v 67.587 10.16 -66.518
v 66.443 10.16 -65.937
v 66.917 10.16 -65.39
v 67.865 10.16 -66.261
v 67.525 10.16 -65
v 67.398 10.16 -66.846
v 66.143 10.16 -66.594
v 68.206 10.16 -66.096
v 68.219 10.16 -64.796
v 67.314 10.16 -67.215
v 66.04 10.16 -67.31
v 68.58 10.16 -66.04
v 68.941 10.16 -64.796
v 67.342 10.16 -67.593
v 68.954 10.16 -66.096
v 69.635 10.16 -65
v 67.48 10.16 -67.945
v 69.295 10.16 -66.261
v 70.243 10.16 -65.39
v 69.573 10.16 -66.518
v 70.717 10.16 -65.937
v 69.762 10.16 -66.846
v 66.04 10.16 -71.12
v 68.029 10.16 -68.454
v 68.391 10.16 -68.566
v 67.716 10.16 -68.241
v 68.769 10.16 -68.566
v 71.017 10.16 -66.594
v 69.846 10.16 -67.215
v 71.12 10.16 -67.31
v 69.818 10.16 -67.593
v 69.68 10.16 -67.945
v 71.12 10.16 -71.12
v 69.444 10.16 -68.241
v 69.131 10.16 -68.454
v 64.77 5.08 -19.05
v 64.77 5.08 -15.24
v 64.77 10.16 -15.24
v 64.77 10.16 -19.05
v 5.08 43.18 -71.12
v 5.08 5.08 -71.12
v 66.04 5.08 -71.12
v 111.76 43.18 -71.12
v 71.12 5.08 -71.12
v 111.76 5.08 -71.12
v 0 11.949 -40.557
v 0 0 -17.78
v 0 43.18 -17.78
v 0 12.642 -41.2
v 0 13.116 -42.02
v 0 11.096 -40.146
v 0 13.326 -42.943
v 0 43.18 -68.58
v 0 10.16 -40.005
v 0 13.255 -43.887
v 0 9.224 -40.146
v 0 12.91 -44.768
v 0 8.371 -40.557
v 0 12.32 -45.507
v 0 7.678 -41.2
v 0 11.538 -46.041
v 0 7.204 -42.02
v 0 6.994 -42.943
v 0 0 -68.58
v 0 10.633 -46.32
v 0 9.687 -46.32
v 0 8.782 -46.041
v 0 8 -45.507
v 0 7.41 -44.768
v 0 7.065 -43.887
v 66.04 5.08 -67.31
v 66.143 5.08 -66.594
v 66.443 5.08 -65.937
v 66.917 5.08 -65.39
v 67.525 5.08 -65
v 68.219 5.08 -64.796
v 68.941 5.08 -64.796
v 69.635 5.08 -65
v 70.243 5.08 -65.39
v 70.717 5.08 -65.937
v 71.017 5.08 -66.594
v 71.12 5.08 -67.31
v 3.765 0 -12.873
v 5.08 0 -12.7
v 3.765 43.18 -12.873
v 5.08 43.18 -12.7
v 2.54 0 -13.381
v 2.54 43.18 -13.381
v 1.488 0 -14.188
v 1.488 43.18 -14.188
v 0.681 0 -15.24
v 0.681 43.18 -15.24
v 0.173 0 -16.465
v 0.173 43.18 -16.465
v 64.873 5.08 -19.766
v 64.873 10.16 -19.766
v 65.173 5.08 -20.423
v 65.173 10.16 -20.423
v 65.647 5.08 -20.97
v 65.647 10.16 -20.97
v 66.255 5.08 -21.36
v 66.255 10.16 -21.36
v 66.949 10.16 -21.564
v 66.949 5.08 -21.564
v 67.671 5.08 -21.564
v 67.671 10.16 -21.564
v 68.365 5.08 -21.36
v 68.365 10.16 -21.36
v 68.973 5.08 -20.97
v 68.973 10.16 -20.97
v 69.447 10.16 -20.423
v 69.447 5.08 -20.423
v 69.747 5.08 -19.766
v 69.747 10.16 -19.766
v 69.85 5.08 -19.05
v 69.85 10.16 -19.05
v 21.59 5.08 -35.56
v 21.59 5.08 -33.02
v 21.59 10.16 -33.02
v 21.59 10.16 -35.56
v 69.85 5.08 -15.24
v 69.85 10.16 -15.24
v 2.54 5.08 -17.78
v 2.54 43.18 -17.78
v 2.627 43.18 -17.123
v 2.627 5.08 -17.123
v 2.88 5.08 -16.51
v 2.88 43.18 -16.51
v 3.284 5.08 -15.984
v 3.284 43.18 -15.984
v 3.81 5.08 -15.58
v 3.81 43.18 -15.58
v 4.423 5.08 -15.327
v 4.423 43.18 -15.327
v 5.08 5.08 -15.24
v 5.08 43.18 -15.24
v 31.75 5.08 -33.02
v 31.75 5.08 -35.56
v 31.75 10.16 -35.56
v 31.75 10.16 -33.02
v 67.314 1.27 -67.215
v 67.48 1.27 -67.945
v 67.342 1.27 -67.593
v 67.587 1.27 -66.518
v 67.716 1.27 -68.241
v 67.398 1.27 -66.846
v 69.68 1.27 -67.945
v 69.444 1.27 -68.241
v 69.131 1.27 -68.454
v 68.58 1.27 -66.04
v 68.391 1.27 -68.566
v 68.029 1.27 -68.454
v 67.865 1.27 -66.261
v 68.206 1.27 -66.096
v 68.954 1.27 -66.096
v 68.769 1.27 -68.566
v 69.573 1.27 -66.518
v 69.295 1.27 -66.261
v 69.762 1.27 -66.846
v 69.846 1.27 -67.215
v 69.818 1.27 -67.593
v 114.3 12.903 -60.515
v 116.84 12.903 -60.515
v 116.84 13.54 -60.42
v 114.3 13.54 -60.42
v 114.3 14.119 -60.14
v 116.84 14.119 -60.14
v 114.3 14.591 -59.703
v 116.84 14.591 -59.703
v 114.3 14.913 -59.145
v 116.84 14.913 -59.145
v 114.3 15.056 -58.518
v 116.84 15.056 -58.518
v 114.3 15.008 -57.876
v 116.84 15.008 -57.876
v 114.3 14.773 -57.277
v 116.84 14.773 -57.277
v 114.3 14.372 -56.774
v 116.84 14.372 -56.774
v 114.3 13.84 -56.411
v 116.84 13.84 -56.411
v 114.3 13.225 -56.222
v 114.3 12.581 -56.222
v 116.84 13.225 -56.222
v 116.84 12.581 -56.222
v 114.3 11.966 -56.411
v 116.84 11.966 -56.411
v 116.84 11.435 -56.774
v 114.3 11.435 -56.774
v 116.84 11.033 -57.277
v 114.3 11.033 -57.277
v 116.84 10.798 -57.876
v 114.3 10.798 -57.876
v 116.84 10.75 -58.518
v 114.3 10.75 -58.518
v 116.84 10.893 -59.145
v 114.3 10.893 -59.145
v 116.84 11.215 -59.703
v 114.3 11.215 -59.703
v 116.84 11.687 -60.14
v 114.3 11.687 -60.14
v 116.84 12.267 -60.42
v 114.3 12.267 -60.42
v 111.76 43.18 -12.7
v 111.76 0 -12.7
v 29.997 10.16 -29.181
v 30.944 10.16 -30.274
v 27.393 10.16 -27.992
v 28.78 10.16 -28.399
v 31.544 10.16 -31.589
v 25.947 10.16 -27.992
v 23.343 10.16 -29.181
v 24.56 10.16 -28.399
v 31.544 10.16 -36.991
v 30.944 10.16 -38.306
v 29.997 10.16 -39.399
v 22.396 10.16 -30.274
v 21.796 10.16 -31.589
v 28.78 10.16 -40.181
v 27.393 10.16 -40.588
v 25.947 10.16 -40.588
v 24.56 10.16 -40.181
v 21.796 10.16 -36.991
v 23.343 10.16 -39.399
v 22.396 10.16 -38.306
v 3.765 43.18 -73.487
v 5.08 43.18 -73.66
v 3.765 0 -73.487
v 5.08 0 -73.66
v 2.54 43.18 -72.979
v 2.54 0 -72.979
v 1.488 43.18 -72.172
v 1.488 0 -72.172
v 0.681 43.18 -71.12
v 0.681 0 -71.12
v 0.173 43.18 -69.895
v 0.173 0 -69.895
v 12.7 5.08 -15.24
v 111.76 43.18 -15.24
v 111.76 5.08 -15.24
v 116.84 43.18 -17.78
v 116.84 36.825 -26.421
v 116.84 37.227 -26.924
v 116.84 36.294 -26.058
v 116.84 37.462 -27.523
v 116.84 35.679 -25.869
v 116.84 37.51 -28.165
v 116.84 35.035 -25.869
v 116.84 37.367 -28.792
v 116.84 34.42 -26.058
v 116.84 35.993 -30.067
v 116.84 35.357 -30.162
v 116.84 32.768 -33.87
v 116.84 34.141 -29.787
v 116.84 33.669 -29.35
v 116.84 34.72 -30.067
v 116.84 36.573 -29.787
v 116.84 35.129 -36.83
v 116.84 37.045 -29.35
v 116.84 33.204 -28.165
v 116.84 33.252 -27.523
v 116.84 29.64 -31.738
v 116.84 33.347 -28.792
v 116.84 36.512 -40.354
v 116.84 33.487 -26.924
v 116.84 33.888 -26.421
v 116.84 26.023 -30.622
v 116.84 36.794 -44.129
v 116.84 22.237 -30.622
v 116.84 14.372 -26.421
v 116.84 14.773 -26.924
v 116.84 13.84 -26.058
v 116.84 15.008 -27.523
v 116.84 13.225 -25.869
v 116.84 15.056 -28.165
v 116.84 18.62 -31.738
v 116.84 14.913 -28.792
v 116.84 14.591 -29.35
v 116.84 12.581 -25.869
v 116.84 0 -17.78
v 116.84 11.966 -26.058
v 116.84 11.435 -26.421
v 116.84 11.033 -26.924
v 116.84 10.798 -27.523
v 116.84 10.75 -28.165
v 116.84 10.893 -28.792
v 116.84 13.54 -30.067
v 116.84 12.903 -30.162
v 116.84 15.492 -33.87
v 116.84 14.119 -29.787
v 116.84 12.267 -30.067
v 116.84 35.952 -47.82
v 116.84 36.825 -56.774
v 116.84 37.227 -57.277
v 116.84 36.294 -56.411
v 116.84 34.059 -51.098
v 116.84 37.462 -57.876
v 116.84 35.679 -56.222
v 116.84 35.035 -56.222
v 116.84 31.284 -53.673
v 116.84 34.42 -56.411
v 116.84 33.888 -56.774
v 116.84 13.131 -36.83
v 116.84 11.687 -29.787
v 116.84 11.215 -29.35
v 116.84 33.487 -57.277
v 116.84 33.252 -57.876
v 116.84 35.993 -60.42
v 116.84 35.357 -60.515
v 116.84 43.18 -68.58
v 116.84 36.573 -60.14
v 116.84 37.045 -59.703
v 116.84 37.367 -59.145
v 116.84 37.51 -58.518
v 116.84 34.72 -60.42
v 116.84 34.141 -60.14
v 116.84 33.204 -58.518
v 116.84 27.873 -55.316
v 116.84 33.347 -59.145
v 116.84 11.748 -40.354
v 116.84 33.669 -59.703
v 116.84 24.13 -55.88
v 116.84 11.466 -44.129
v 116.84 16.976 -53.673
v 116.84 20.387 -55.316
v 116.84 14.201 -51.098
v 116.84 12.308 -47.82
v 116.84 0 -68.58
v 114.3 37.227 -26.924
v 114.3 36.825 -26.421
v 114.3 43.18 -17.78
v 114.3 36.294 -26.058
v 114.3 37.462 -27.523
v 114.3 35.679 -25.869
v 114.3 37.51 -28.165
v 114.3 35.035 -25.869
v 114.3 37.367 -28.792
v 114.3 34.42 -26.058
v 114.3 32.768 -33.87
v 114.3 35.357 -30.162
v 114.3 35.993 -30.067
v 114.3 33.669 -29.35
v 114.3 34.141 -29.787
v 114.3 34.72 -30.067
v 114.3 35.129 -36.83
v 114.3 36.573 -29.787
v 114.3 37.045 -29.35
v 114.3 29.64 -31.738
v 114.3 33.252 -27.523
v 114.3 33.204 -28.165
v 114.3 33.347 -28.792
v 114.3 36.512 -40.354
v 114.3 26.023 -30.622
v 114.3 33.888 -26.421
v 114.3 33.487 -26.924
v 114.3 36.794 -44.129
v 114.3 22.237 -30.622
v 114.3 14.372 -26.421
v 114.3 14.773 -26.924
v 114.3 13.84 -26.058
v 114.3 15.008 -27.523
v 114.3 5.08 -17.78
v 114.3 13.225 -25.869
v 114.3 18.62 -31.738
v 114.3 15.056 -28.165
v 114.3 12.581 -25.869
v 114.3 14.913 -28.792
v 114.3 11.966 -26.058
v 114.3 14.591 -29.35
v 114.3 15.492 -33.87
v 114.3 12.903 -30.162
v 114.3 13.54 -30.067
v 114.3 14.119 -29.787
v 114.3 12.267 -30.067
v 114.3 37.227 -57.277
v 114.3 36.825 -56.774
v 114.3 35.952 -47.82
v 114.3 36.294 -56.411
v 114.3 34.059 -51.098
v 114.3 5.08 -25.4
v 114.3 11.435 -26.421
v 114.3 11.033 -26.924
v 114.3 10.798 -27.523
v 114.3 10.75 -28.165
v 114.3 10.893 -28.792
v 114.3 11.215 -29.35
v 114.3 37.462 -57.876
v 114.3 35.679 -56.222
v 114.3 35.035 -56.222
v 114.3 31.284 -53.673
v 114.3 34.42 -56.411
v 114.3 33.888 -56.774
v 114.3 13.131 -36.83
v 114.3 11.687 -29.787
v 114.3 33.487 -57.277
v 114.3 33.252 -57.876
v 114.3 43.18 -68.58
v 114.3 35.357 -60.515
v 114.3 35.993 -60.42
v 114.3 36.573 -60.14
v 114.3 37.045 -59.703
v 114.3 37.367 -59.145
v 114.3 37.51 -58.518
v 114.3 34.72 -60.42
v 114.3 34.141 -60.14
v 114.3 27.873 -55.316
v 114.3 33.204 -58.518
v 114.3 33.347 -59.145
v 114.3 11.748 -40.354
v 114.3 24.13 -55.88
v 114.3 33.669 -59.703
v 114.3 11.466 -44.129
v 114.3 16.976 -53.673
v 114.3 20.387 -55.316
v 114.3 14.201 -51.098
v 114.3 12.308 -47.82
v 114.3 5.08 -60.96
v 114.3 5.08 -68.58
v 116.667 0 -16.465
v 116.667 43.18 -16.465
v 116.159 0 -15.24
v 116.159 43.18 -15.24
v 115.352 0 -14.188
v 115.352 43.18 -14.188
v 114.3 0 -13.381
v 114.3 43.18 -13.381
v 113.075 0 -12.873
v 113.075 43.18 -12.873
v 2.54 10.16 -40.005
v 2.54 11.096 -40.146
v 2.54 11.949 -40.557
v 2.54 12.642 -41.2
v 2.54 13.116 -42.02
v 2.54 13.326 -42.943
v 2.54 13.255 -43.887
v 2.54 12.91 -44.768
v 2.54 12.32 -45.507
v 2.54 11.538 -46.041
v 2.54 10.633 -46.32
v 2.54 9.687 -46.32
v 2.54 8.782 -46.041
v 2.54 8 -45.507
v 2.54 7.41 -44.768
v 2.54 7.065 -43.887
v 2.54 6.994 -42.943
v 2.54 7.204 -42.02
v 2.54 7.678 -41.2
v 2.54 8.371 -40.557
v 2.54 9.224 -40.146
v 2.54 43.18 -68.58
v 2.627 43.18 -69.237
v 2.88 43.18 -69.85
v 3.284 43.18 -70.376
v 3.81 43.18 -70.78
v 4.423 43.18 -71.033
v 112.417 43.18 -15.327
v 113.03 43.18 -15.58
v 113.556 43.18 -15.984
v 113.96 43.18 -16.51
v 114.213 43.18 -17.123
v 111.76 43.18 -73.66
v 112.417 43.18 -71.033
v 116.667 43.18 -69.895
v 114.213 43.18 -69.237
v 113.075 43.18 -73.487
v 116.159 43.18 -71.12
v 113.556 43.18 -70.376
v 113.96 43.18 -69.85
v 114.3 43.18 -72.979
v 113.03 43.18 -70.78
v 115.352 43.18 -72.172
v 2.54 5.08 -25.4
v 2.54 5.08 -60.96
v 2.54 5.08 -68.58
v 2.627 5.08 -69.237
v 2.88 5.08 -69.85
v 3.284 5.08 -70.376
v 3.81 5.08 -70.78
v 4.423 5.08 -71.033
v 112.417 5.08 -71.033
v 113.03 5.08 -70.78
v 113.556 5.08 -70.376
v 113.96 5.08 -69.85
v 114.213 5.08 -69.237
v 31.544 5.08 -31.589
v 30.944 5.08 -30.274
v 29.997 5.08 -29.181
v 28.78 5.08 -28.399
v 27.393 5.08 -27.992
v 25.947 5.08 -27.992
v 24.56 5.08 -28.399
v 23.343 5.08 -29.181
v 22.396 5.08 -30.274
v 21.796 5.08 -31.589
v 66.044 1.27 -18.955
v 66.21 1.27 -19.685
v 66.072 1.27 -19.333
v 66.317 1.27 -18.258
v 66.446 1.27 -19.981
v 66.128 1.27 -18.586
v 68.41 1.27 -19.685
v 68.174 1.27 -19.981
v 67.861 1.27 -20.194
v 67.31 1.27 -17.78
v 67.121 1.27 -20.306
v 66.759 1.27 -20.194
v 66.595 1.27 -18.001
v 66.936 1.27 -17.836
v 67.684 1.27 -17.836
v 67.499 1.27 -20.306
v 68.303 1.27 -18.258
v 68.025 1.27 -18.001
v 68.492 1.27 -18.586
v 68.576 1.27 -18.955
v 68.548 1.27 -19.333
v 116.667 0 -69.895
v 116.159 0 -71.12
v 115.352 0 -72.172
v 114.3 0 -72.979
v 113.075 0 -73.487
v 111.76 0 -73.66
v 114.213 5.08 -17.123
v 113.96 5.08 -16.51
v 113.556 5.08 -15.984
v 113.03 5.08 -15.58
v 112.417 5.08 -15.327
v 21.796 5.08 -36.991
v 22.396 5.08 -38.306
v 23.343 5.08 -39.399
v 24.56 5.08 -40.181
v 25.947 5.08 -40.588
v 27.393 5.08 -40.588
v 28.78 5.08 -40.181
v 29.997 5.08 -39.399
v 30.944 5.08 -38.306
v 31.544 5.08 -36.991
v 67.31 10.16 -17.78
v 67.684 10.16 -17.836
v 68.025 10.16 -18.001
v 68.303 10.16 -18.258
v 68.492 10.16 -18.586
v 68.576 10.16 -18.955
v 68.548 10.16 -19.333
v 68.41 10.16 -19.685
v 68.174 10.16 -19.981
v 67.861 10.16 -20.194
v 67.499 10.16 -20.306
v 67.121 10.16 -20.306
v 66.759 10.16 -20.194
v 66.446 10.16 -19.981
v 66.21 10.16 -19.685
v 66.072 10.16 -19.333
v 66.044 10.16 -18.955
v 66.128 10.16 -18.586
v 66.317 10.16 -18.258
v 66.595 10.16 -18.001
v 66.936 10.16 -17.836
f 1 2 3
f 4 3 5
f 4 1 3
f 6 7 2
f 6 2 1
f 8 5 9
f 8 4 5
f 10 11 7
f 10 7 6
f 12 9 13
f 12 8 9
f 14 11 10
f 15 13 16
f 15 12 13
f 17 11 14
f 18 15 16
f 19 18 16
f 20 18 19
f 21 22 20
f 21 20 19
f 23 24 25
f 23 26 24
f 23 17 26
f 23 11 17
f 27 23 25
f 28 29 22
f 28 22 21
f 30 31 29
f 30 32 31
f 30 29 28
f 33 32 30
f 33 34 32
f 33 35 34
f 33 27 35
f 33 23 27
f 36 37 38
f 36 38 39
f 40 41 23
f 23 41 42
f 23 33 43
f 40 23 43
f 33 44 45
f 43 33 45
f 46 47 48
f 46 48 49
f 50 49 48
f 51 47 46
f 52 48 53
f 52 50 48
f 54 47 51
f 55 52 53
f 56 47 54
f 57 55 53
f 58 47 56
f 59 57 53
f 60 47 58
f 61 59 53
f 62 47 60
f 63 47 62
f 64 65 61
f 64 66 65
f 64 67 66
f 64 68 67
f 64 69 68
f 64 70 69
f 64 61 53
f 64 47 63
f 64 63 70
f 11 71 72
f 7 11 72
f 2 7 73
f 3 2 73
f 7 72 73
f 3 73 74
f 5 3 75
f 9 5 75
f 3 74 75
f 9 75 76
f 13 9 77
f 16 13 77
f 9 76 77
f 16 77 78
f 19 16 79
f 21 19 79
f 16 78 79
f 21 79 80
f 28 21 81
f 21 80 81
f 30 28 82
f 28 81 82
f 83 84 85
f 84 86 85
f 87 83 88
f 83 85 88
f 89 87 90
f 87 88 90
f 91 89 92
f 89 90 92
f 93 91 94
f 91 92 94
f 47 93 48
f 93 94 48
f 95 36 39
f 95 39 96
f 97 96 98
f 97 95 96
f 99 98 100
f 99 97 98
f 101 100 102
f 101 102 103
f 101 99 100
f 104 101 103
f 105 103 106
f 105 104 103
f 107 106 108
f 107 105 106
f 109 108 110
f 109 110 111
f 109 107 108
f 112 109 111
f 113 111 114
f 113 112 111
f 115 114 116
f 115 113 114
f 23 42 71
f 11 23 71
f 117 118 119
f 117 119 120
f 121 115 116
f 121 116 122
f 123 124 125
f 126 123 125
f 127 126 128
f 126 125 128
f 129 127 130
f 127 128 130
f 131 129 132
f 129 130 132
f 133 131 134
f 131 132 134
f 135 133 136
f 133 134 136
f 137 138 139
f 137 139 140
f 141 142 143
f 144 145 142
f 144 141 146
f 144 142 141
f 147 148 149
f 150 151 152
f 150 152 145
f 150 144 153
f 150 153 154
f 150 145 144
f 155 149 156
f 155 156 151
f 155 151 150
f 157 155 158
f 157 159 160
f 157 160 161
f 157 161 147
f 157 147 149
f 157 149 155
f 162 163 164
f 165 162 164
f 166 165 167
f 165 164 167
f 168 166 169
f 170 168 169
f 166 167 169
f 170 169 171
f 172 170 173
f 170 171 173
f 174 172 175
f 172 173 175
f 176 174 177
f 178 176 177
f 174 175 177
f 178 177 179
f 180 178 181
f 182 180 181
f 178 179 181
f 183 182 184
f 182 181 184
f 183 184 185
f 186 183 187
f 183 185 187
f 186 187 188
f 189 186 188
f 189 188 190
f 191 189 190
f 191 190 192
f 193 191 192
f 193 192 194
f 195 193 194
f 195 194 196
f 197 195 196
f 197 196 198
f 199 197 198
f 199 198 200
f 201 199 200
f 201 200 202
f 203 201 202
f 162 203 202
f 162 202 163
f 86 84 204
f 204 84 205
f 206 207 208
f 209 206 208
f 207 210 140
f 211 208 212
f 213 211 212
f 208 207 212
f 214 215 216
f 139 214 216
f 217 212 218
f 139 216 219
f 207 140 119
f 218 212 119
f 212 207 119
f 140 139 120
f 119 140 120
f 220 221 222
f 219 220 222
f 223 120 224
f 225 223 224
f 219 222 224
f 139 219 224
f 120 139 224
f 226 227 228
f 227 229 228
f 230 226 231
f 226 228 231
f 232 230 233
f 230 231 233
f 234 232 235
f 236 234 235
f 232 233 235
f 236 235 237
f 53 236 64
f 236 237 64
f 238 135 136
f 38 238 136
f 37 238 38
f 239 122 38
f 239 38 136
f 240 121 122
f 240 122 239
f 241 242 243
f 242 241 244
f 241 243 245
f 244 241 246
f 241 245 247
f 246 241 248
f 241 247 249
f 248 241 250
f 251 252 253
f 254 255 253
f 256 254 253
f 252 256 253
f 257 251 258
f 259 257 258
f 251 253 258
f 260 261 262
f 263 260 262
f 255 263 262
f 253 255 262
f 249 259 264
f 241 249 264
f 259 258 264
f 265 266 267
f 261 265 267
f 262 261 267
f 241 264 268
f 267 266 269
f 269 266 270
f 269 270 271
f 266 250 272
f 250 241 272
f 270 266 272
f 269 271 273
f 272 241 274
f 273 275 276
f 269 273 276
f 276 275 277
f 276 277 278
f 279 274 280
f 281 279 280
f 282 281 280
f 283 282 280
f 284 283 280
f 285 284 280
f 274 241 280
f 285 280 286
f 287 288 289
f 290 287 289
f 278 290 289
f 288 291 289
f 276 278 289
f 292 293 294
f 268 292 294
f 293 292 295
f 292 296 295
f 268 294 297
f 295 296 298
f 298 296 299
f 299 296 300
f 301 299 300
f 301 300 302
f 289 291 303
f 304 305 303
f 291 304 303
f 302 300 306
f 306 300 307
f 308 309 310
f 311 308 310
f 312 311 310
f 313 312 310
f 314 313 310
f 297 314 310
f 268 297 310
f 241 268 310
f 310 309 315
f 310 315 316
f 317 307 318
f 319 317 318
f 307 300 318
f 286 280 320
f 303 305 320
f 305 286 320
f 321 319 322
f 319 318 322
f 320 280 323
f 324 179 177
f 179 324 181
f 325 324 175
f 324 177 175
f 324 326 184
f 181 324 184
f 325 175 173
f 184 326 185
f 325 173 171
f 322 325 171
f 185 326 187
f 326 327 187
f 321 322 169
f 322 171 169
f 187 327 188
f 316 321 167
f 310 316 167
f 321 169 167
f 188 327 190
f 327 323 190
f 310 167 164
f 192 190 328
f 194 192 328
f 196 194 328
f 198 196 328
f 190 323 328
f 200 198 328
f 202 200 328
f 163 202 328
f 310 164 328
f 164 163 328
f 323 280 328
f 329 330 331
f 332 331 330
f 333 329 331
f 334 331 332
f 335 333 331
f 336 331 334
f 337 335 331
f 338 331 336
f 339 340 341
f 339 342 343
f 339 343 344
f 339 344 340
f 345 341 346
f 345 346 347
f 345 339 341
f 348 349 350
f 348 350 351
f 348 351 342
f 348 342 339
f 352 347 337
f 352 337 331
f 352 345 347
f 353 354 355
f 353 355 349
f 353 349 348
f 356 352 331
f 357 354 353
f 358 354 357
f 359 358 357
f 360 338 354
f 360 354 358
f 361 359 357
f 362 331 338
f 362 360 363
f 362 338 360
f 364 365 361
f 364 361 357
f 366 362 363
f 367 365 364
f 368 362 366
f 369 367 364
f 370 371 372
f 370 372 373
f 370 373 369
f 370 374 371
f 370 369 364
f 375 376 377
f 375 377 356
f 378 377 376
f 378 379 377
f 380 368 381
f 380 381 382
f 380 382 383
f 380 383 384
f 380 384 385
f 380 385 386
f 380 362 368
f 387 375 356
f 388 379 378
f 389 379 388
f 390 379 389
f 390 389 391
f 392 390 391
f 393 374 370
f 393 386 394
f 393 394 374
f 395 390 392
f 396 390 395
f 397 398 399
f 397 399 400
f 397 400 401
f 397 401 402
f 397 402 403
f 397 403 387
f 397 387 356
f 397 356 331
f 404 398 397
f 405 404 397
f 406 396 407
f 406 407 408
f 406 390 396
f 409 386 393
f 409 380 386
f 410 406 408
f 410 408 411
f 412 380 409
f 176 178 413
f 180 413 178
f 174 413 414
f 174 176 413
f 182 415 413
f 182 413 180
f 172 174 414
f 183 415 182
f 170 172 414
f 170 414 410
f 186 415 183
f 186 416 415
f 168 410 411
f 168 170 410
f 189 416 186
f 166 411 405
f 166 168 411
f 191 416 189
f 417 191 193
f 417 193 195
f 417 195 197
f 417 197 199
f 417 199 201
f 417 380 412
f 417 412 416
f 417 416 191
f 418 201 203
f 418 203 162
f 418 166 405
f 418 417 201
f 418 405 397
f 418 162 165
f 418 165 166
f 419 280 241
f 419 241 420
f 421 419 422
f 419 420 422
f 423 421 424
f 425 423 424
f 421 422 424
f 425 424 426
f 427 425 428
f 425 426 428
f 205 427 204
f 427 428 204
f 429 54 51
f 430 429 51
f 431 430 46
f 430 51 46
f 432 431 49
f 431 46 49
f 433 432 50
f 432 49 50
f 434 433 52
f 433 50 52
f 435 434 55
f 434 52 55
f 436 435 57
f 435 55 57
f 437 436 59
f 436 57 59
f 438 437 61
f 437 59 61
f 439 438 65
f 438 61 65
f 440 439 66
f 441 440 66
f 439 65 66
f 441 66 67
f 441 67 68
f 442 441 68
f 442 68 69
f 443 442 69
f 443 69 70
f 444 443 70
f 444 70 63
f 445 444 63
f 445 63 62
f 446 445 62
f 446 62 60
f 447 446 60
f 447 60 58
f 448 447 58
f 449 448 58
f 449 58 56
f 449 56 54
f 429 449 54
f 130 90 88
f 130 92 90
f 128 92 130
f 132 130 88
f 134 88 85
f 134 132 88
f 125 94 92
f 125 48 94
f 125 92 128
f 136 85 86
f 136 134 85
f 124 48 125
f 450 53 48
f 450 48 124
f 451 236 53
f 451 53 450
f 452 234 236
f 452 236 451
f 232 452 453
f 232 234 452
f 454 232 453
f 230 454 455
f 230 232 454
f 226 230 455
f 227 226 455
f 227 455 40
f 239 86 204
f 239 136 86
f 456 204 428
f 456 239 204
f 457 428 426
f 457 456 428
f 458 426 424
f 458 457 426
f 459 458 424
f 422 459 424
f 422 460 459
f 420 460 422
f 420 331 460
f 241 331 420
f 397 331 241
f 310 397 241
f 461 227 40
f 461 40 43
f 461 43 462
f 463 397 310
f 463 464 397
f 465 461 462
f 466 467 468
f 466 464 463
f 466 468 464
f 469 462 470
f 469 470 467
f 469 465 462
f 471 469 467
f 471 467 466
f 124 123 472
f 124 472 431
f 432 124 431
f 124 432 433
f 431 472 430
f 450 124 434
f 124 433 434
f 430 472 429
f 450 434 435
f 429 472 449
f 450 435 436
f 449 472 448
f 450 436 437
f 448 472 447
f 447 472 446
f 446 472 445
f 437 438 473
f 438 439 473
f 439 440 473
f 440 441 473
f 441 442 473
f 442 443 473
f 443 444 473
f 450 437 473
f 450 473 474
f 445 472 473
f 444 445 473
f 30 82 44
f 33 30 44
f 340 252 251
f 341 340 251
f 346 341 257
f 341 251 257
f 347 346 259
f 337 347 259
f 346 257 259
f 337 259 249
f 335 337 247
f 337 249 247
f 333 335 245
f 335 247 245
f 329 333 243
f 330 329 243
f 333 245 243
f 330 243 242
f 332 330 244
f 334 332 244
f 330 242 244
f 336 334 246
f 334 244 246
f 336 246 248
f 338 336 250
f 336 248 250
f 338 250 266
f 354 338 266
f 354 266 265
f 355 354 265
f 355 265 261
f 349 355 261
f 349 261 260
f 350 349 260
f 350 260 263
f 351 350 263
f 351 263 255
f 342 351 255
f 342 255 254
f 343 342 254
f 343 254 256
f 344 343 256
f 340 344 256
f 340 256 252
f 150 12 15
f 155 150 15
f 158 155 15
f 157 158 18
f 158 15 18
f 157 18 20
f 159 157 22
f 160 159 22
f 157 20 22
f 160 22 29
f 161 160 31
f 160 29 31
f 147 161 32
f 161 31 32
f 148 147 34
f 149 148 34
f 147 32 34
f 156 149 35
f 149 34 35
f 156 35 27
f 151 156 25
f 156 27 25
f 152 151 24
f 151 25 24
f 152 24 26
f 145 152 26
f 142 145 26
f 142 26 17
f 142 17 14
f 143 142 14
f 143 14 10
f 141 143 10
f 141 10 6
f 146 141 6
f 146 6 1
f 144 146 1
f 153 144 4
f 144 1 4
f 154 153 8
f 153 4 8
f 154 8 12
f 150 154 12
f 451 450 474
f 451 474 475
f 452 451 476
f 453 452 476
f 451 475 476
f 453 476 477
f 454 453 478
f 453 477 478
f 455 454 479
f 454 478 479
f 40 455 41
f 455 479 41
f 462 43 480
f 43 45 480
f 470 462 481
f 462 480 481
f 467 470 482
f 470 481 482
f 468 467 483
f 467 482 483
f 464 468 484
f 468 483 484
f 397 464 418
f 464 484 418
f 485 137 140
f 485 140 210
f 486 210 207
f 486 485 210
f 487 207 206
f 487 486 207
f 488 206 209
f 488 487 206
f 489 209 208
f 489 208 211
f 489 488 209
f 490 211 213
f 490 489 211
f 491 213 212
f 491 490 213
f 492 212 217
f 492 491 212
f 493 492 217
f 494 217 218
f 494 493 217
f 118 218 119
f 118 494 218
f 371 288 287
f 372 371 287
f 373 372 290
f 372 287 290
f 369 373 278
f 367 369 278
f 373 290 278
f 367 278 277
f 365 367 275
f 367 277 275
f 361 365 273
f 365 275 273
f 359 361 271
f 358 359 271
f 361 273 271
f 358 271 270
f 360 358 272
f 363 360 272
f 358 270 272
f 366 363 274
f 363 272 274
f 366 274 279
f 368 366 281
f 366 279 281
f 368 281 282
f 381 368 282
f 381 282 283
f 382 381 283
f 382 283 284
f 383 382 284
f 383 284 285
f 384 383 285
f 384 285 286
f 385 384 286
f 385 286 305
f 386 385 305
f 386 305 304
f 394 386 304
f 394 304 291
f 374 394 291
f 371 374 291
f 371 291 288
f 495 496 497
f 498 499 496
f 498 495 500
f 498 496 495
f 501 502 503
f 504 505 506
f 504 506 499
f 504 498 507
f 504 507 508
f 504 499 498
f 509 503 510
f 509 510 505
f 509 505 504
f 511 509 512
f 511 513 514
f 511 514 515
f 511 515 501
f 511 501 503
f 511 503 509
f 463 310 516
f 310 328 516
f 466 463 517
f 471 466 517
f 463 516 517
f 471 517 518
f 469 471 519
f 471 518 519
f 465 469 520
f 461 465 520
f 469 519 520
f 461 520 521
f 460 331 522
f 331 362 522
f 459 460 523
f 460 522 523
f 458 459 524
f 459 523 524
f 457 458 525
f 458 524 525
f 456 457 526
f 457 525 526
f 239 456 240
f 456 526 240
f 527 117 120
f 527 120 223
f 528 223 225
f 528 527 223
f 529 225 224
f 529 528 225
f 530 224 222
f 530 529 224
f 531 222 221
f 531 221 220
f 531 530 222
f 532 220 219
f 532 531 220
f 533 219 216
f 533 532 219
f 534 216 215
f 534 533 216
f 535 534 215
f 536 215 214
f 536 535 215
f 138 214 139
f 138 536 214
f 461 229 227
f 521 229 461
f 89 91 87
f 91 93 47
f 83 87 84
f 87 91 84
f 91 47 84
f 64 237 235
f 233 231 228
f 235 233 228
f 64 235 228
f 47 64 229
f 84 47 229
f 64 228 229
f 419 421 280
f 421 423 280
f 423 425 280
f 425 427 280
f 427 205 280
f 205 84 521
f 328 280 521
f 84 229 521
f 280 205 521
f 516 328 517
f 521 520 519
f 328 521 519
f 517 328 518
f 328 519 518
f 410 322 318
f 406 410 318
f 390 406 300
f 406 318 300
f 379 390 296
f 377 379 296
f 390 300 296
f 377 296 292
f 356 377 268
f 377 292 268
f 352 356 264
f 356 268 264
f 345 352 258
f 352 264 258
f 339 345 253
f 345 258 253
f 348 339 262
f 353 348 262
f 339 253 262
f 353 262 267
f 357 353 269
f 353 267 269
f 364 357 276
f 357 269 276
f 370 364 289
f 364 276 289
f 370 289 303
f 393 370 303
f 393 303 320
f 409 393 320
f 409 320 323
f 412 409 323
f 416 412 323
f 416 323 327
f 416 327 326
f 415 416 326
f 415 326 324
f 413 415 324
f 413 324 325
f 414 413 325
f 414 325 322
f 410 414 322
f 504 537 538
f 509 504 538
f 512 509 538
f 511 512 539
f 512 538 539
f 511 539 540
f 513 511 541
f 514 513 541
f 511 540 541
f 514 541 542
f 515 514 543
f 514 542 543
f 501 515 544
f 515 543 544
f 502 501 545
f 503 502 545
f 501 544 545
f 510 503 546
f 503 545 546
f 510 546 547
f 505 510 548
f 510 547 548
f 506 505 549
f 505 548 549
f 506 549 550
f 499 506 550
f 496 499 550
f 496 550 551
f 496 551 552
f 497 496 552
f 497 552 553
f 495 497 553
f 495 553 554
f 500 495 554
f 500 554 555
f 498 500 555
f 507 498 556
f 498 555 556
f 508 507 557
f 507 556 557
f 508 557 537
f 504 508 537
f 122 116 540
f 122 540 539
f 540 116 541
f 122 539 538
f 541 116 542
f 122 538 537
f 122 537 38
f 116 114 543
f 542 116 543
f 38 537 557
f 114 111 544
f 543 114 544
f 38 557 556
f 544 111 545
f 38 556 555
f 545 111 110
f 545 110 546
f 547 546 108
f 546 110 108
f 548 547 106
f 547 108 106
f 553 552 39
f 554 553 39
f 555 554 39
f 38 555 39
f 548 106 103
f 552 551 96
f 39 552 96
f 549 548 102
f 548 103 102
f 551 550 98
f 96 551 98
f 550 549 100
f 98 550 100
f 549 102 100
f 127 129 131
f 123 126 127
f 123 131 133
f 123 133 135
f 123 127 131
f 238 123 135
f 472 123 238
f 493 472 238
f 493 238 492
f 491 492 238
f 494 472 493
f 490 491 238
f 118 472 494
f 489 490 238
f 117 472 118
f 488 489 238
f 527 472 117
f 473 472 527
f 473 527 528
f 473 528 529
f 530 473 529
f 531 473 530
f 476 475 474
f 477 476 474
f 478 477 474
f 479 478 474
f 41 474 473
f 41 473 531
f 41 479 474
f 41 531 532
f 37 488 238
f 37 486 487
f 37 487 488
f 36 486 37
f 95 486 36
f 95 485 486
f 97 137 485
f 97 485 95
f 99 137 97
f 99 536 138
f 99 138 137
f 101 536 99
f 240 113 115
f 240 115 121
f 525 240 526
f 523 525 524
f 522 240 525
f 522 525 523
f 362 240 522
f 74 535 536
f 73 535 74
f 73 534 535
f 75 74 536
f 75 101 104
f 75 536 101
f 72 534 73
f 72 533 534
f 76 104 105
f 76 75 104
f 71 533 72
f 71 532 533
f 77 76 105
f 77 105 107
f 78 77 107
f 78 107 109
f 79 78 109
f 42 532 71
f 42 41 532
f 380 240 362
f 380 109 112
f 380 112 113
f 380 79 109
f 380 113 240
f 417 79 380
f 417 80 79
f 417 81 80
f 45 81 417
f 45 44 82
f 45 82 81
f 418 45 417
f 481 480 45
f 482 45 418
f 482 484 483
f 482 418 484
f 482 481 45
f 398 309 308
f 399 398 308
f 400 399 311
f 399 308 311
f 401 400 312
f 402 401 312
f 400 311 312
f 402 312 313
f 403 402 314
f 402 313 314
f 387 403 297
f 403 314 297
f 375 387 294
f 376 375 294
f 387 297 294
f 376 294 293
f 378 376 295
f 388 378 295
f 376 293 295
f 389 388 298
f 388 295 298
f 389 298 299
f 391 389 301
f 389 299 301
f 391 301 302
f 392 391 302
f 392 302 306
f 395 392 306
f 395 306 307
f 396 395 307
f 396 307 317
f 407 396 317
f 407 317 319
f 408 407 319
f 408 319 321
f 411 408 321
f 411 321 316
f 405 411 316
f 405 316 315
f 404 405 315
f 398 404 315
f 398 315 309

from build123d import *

# Parameters (mm, degrees)
SKETCH1_W            = 116.84
SKETCH1_H            = 86.36
BOSS_EXTRUDE2_DEPTH  = 5.08
FILLET1_R            = 12.7
SKETCH3_W            = 116.84
SKETCH3_H            = 60.96
SKETCH3_W_2          = 111.76
SKETCH3_H_2          = 55.88
BOSS_EXTRUDE3_DEPTH  = 38.1
SKETCH4_W            = 10.16
SKETCH4_H            = 10.16
BOSS_EXTRUDE5_DEPTH  = 34.29
FILLET3_R            = 5.08
SKETCH5_R            = 1.27
CUT_EXTRUDE1_DEPTH   = 34.29
CUT_EXTRUDE2_START   = -5.08
SKETCH6_W            = 198.457473549
SKETCH6_H            = 149.814535244
SKETCH6_W_2          = 116.84
SKETCH6_H_2          = 60.96
CUT_EXTRUDE2_DEPTH   = 5.08
FILLET6_R            = 5.08
CUT_EXTRUDE3_REACH   = 146.713
SKETCH7_R            = 12.7
SKETCH7_R_2          = 2.159
CUT_EXTRUDE4_REACH   = 146.713
SKETCH8_R            = 3.175
BOSS_EXTRUDE9_DEPTH  = 5.08
SKETCH14_R           = 1.27
CUT_EXTRUDE6_DEPTH   = 8.89
SKETCH21_W           = 111.76
SKETCH21_H           = 55.88
CUT_EXTRUDE7_DEPTH   = 29.21
SKETCH22_W           = 20.924478465
SKETCH22_H           = 12.476012494
SKETCH22_W_2         = 15.618152649
SKETCH22_H_2         = 14.190033702
SKETCH22_W_3         = 16.110334819
SKETCH22_H_3         = 13.876033943
SKETCH22_W_4         = 12.045494613
CUT_EXTRUDE8_DEPTH   = 5.08
FILLET7_R            = 2.54
BOSS_EXTRUDE10_DEPTH = 5.08


with BuildPart() as part:
    # Sketch1 → Boss-Extrude2 (new body)
    with BuildSketch(Plane(origin=(0, 0, 0), x_dir=(1, 0, 0), z_dir=(0, 1, 0))):
        with Locations((58.42, 43.18)):
            Rectangle(SKETCH1_W, SKETCH1_H)
    extrude(amount=BOSS_EXTRUDE2_DEPTH)

    # Fillet1
    fillet1_edges = [part.edges().sort_by_distance(p)[0] for p in [
        (0, 2.54, -86.36),
        (116.84, 2.54, -86.36),
        (116.84, 2.54, 0),
        (0, 2.54, 0),
    ]]
    fillet(fillet1_edges, radius=FILLET1_R)

    # Sketch3 → Boss-Extrude3 (add)
    with BuildSketch(Plane(origin=(0, 5.08, 0), x_dir=(1, 0, 0), z_dir=(0, 1, 0))):
        with Locations((58.42, 43.18)):
            Rectangle(SKETCH3_W, SKETCH3_H)
        with Locations((58.42, 43.18)):
            Rectangle(SKETCH3_W_2, SKETCH3_H_2, mode=Mode.SUBTRACT)
    extrude(amount=BOSS_EXTRUDE3_DEPTH)

    # Sketch4 → Boss-Extrude5 (add)
    with BuildSketch(Plane(origin=(0, 5.08, 0), x_dir=(1, 0, 0), z_dir=(0, 1, 0))):
        with Locations((7.62, 66.04)):
            Rectangle(SKETCH4_W, SKETCH4_H)
        with Locations((109.22, 66.04)):
            Rectangle(SKETCH4_W, SKETCH4_H)
        with Locations((109.22, 20.32)):
            Rectangle(SKETCH4_W, SKETCH4_H)
        with Locations((7.62, 20.32)):
            Rectangle(SKETCH4_W, SKETCH4_H)
    extrude(amount=BOSS_EXTRUDE5_DEPTH)

    # Fillet3
    fillet3_edges = [part.edges().sort_by_distance(p)[0] for p in [
        (12.7, 22.225, -25.4),
        (12.7, 22.225, -60.96),
        (104.14, 22.225, -60.96),
        (104.14, 22.225, -25.4),
    ]]
    fillet(fillet3_edges, radius=FILLET3_R)

    # Sketch5 → Cut-Extrude1 (cut)
    with BuildSketch(Plane(origin=(0, 39.37, 0), x_dir=(1, 0, 0), z_dir=(0, 1, 0))):
        with Locations(Location((7.62, 66.04, 0), (0, 0, 270))):
            Circle(SKETCH5_R)
        with Locations(Location((109.22, 66.04, 0), (0, 0, 270))):
            Circle(SKETCH5_R)
        with Locations(Location((109.22, 20.32, 0), (0, 0, 270))):
            Circle(SKETCH5_R)
        with Locations(Location((7.62, 20.32, 0), (0, 0, 270))):
            Circle(SKETCH5_R)
    extrude(amount=-CUT_EXTRUDE1_DEPTH, mode=Mode.SUBTRACT)

    # Sketch6 → Cut-Extrude2 (cut)
    with BuildSketch(Plane(origin=(0, 5.08, 0), x_dir=(1, 0, 0), z_dir=(0, 1, 0)).offset(CUT_EXTRUDE2_START)):
        with Locations((67.603582621, 44.619641428)):
            Rectangle(SKETCH6_W, SKETCH6_H)
        with Locations((58.42, 43.18)):
            Rectangle(SKETCH6_W_2, SKETCH6_H_2, mode=Mode.SUBTRACT)
    extrude(amount=CUT_EXTRUDE2_DEPTH, mode=Mode.SUBTRACT)

    # Fillet6
    fillet6_edges = [part.edges().sort_by_distance(p)[0] for p in [
        (0, 21.59, -12.7),
        (0, 21.59, -73.66),
        (116.84, 21.59, -12.7),
        (116.84, 21.59, -73.66),
    ]]
    fillet(fillet6_edges, radius=FILLET6_R)

    # Sketch7 → Cut-Extrude3 (cut, up to next)
    with BuildSketch(Plane(origin=(116.84, 0, 0), x_dir=(0, 0, -1), z_dir=(1, 0, 0)), mode=Mode.PRIVATE) as cut_extrude3_sk1:
        with Locations((43.18, 24.13)):
            Circle(SKETCH7_R)
    cut_extrude3_tool1 = extrude(cut_extrude3_sk1.sketch, amount=-CUT_EXTRUDE3_REACH, mode=Mode.PRIVATE) & part.part
    # Sketch7 → Cut-Extrude3 (cut, up to next)
    with BuildSketch(Plane(origin=(116.84, 0, 0), x_dir=(0, 0, -1), z_dir=(1, 0, 0)), mode=Mode.PRIVATE) as cut_extrude3_sk2:
        with Locations((28.0035, 35.3568)):
            Circle(SKETCH7_R_2)
    cut_extrude3_tool2 = extrude(cut_extrude3_sk2.sketch, amount=-CUT_EXTRUDE3_REACH, mode=Mode.PRIVATE) & part.part
    # Sketch7 → Cut-Extrude3 (cut, up to next)
    with BuildSketch(Plane(origin=(116.84, 0, 0), x_dir=(0, 0, -1), z_dir=(1, 0, 0)), mode=Mode.PRIVATE) as cut_extrude3_sk3:
        with Locations((58.3565, 35.3568)):
            Circle(SKETCH7_R_2)
    cut_extrude3_tool3 = extrude(cut_extrude3_sk3.sketch, amount=-CUT_EXTRUDE3_REACH, mode=Mode.PRIVATE) & part.part
    # Sketch7 → Cut-Extrude3 (cut, up to next)
    with BuildSketch(Plane(origin=(116.84, 0, 0), x_dir=(0, 0, -1), z_dir=(1, 0, 0)), mode=Mode.PRIVATE) as cut_extrude3_sk4:
        with Locations((28.0035, 12.9032)):
            Circle(SKETCH7_R_2)
    cut_extrude3_tool4 = extrude(cut_extrude3_sk4.sketch, amount=-CUT_EXTRUDE3_REACH, mode=Mode.PRIVATE) & part.part
    # Sketch7 → Cut-Extrude3 (cut, up to next)
    with BuildSketch(Plane(origin=(116.84, 0, 0), x_dir=(0, 0, -1), z_dir=(1, 0, 0)), mode=Mode.PRIVATE) as cut_extrude3_sk5:
        with Locations((58.3565, 12.9032)):
            Circle(SKETCH7_R_2)
    cut_extrude3_tool5 = extrude(cut_extrude3_sk5.sketch, amount=-CUT_EXTRUDE3_REACH, mode=Mode.PRIVATE) & part.part
    add(cut_extrude3_tool1.solids().sort_by_distance((116.84, 24.13, -43.18))[0], mode=Mode.SUBTRACT)
    add(cut_extrude3_tool2.solids().sort_by_distance((116.84, 35.3568, -28.0035))[0], mode=Mode.SUBTRACT)
    add(cut_extrude3_tool3.solids().sort_by_distance((116.84, 35.3568, -58.3565))[0], mode=Mode.SUBTRACT)
    add(cut_extrude3_tool4.solids().sort_by_distance((116.84, 12.9032, -28.0035))[0], mode=Mode.SUBTRACT)
    add(cut_extrude3_tool5.solids().sort_by_distance((116.84, 12.9032, -58.3565))[0], mode=Mode.SUBTRACT)

    # Sketch8 → Cut-Extrude4 (cut, up to next)
    with BuildSketch(Plane.ZY, mode=Mode.PRIVATE) as cut_extrude4_sk1:
        with Locations((-43.18, 10.16)):
            Circle(SKETCH8_R)
    cut_extrude4_tool1 = extrude(cut_extrude4_sk1.sketch, amount=-CUT_EXTRUDE4_REACH, mode=Mode.PRIVATE) & part.part
    add(cut_extrude4_tool1.solids().sort_by_distance((0, 10.16, -43.18))[0], mode=Mode.SUBTRACT)

    # Sketch10 → Boss-Extrude9 (add)
    with BuildSketch(Plane(origin=(0, 5.08, 0), x_dir=(1, 0, 0), z_dir=(0, 1, 0))):
        with BuildLine():
            Line((69.85, 19.05), (69.85, 15.24))
            Line((69.85, 15.24), (64.77, 15.24))
            Line((64.77, 15.24), (64.77, 19.05))
            ThreePointArc((64.77, 19.05), (67.31, 21.59), (69.85, 19.05))
        make_face()
        with BuildLine():
            Line((71.12, 67.31), (71.12, 71.12))
            Line((71.12, 71.12), (66.04, 71.12))
            Line((66.04, 71.12), (66.04, 67.31))
            ThreePointArc((66.04, 67.31), (68.58, 64.77), (71.12, 67.31))
        make_face()
    extrude(amount=BOSS_EXTRUDE9_DEPTH)

    # Sketch14 → Cut-Extrude6 (cut)
    with BuildSketch(Plane(origin=(0, 10.16, 0), x_dir=(1, 0, 0), z_dir=(0, 1, 0))):
        with Locations(Location((67.31, 19.05, 0), (0, 0, 270))):
            Circle(SKETCH14_R)
        with Locations(Location((68.58, 67.31, 0), (0, 0, 270))):
            Circle(SKETCH14_R)
    extrude(amount=-CUT_EXTRUDE6_DEPTH, mode=Mode.SUBTRACT)

    # Sketch21 → Cut-Extrude7 (cut)
    with BuildSketch(Plane(origin=(0, 39.37, 0), x_dir=(1, 0, 0), z_dir=(0, 1, 0))):
        with Locations((58.42, 43.18)):
            Rectangle(SKETCH21_W, SKETCH21_H)
    extrude(amount=-CUT_EXTRUDE7_DEPTH, mode=Mode.SUBTRACT)

    # Sketch22 → Cut-Extrude8 (cut)
    with BuildSketch(Plane(origin=(0, 10.16, 0), x_dir=(1, 0, 0), z_dir=(0, 1, 0))):
        with Locations((103.837760768, 21.478006247)):
            Rectangle(SKETCH22_W, SKETCH22_H)
        with Locations((106.490923675, 64.024983149)):
            Rectangle(SKETCH22_W_2, SKETCH22_H_2)
        with Locations((10.59516741, 22.178016971)):
            Rectangle(SKETCH22_W_3, SKETCH22_H_3)
        with Locations((8.562747307, 64.024983149)):
            Rectangle(SKETCH22_W_4, SKETCH22_H_2)
    extrude(amount=-CUT_EXTRUDE8_DEPTH, mode=Mode.SUBTRACT)

    # Fillet7
    fillet7_edges = [part.edges().sort_by_distance(p)[0] for p in [
        (2.54, 24.13, -15.24),
        (114.3, 24.13, -15.24),
        (114.3, 24.13, -71.12),
        (2.54, 24.13, -71.12),
    ]]
    fillet(fillet7_edges, radius=FILLET7_R)

    # Sketch15 → Boss-Extrude10 (add)
    with BuildSketch(Plane(origin=(0, 5.08, 0), x_dir=(1, 0, 0), z_dir=(0, 1, 0))):
        with BuildLine():
            Line((21.59, 33.02), (21.59, 35.56))
            ThreePointArc((21.59, 35.56), (26.67, 40.64), (31.75, 35.56))
            Line((31.75, 35.56), (31.75, 33.02))
            ThreePointArc((31.75, 33.02), (26.67, 27.94), (21.59, 33.02))
        make_face()
    extrude(amount=BOSS_EXTRUDE10_DEPTH)


solid = part.part
